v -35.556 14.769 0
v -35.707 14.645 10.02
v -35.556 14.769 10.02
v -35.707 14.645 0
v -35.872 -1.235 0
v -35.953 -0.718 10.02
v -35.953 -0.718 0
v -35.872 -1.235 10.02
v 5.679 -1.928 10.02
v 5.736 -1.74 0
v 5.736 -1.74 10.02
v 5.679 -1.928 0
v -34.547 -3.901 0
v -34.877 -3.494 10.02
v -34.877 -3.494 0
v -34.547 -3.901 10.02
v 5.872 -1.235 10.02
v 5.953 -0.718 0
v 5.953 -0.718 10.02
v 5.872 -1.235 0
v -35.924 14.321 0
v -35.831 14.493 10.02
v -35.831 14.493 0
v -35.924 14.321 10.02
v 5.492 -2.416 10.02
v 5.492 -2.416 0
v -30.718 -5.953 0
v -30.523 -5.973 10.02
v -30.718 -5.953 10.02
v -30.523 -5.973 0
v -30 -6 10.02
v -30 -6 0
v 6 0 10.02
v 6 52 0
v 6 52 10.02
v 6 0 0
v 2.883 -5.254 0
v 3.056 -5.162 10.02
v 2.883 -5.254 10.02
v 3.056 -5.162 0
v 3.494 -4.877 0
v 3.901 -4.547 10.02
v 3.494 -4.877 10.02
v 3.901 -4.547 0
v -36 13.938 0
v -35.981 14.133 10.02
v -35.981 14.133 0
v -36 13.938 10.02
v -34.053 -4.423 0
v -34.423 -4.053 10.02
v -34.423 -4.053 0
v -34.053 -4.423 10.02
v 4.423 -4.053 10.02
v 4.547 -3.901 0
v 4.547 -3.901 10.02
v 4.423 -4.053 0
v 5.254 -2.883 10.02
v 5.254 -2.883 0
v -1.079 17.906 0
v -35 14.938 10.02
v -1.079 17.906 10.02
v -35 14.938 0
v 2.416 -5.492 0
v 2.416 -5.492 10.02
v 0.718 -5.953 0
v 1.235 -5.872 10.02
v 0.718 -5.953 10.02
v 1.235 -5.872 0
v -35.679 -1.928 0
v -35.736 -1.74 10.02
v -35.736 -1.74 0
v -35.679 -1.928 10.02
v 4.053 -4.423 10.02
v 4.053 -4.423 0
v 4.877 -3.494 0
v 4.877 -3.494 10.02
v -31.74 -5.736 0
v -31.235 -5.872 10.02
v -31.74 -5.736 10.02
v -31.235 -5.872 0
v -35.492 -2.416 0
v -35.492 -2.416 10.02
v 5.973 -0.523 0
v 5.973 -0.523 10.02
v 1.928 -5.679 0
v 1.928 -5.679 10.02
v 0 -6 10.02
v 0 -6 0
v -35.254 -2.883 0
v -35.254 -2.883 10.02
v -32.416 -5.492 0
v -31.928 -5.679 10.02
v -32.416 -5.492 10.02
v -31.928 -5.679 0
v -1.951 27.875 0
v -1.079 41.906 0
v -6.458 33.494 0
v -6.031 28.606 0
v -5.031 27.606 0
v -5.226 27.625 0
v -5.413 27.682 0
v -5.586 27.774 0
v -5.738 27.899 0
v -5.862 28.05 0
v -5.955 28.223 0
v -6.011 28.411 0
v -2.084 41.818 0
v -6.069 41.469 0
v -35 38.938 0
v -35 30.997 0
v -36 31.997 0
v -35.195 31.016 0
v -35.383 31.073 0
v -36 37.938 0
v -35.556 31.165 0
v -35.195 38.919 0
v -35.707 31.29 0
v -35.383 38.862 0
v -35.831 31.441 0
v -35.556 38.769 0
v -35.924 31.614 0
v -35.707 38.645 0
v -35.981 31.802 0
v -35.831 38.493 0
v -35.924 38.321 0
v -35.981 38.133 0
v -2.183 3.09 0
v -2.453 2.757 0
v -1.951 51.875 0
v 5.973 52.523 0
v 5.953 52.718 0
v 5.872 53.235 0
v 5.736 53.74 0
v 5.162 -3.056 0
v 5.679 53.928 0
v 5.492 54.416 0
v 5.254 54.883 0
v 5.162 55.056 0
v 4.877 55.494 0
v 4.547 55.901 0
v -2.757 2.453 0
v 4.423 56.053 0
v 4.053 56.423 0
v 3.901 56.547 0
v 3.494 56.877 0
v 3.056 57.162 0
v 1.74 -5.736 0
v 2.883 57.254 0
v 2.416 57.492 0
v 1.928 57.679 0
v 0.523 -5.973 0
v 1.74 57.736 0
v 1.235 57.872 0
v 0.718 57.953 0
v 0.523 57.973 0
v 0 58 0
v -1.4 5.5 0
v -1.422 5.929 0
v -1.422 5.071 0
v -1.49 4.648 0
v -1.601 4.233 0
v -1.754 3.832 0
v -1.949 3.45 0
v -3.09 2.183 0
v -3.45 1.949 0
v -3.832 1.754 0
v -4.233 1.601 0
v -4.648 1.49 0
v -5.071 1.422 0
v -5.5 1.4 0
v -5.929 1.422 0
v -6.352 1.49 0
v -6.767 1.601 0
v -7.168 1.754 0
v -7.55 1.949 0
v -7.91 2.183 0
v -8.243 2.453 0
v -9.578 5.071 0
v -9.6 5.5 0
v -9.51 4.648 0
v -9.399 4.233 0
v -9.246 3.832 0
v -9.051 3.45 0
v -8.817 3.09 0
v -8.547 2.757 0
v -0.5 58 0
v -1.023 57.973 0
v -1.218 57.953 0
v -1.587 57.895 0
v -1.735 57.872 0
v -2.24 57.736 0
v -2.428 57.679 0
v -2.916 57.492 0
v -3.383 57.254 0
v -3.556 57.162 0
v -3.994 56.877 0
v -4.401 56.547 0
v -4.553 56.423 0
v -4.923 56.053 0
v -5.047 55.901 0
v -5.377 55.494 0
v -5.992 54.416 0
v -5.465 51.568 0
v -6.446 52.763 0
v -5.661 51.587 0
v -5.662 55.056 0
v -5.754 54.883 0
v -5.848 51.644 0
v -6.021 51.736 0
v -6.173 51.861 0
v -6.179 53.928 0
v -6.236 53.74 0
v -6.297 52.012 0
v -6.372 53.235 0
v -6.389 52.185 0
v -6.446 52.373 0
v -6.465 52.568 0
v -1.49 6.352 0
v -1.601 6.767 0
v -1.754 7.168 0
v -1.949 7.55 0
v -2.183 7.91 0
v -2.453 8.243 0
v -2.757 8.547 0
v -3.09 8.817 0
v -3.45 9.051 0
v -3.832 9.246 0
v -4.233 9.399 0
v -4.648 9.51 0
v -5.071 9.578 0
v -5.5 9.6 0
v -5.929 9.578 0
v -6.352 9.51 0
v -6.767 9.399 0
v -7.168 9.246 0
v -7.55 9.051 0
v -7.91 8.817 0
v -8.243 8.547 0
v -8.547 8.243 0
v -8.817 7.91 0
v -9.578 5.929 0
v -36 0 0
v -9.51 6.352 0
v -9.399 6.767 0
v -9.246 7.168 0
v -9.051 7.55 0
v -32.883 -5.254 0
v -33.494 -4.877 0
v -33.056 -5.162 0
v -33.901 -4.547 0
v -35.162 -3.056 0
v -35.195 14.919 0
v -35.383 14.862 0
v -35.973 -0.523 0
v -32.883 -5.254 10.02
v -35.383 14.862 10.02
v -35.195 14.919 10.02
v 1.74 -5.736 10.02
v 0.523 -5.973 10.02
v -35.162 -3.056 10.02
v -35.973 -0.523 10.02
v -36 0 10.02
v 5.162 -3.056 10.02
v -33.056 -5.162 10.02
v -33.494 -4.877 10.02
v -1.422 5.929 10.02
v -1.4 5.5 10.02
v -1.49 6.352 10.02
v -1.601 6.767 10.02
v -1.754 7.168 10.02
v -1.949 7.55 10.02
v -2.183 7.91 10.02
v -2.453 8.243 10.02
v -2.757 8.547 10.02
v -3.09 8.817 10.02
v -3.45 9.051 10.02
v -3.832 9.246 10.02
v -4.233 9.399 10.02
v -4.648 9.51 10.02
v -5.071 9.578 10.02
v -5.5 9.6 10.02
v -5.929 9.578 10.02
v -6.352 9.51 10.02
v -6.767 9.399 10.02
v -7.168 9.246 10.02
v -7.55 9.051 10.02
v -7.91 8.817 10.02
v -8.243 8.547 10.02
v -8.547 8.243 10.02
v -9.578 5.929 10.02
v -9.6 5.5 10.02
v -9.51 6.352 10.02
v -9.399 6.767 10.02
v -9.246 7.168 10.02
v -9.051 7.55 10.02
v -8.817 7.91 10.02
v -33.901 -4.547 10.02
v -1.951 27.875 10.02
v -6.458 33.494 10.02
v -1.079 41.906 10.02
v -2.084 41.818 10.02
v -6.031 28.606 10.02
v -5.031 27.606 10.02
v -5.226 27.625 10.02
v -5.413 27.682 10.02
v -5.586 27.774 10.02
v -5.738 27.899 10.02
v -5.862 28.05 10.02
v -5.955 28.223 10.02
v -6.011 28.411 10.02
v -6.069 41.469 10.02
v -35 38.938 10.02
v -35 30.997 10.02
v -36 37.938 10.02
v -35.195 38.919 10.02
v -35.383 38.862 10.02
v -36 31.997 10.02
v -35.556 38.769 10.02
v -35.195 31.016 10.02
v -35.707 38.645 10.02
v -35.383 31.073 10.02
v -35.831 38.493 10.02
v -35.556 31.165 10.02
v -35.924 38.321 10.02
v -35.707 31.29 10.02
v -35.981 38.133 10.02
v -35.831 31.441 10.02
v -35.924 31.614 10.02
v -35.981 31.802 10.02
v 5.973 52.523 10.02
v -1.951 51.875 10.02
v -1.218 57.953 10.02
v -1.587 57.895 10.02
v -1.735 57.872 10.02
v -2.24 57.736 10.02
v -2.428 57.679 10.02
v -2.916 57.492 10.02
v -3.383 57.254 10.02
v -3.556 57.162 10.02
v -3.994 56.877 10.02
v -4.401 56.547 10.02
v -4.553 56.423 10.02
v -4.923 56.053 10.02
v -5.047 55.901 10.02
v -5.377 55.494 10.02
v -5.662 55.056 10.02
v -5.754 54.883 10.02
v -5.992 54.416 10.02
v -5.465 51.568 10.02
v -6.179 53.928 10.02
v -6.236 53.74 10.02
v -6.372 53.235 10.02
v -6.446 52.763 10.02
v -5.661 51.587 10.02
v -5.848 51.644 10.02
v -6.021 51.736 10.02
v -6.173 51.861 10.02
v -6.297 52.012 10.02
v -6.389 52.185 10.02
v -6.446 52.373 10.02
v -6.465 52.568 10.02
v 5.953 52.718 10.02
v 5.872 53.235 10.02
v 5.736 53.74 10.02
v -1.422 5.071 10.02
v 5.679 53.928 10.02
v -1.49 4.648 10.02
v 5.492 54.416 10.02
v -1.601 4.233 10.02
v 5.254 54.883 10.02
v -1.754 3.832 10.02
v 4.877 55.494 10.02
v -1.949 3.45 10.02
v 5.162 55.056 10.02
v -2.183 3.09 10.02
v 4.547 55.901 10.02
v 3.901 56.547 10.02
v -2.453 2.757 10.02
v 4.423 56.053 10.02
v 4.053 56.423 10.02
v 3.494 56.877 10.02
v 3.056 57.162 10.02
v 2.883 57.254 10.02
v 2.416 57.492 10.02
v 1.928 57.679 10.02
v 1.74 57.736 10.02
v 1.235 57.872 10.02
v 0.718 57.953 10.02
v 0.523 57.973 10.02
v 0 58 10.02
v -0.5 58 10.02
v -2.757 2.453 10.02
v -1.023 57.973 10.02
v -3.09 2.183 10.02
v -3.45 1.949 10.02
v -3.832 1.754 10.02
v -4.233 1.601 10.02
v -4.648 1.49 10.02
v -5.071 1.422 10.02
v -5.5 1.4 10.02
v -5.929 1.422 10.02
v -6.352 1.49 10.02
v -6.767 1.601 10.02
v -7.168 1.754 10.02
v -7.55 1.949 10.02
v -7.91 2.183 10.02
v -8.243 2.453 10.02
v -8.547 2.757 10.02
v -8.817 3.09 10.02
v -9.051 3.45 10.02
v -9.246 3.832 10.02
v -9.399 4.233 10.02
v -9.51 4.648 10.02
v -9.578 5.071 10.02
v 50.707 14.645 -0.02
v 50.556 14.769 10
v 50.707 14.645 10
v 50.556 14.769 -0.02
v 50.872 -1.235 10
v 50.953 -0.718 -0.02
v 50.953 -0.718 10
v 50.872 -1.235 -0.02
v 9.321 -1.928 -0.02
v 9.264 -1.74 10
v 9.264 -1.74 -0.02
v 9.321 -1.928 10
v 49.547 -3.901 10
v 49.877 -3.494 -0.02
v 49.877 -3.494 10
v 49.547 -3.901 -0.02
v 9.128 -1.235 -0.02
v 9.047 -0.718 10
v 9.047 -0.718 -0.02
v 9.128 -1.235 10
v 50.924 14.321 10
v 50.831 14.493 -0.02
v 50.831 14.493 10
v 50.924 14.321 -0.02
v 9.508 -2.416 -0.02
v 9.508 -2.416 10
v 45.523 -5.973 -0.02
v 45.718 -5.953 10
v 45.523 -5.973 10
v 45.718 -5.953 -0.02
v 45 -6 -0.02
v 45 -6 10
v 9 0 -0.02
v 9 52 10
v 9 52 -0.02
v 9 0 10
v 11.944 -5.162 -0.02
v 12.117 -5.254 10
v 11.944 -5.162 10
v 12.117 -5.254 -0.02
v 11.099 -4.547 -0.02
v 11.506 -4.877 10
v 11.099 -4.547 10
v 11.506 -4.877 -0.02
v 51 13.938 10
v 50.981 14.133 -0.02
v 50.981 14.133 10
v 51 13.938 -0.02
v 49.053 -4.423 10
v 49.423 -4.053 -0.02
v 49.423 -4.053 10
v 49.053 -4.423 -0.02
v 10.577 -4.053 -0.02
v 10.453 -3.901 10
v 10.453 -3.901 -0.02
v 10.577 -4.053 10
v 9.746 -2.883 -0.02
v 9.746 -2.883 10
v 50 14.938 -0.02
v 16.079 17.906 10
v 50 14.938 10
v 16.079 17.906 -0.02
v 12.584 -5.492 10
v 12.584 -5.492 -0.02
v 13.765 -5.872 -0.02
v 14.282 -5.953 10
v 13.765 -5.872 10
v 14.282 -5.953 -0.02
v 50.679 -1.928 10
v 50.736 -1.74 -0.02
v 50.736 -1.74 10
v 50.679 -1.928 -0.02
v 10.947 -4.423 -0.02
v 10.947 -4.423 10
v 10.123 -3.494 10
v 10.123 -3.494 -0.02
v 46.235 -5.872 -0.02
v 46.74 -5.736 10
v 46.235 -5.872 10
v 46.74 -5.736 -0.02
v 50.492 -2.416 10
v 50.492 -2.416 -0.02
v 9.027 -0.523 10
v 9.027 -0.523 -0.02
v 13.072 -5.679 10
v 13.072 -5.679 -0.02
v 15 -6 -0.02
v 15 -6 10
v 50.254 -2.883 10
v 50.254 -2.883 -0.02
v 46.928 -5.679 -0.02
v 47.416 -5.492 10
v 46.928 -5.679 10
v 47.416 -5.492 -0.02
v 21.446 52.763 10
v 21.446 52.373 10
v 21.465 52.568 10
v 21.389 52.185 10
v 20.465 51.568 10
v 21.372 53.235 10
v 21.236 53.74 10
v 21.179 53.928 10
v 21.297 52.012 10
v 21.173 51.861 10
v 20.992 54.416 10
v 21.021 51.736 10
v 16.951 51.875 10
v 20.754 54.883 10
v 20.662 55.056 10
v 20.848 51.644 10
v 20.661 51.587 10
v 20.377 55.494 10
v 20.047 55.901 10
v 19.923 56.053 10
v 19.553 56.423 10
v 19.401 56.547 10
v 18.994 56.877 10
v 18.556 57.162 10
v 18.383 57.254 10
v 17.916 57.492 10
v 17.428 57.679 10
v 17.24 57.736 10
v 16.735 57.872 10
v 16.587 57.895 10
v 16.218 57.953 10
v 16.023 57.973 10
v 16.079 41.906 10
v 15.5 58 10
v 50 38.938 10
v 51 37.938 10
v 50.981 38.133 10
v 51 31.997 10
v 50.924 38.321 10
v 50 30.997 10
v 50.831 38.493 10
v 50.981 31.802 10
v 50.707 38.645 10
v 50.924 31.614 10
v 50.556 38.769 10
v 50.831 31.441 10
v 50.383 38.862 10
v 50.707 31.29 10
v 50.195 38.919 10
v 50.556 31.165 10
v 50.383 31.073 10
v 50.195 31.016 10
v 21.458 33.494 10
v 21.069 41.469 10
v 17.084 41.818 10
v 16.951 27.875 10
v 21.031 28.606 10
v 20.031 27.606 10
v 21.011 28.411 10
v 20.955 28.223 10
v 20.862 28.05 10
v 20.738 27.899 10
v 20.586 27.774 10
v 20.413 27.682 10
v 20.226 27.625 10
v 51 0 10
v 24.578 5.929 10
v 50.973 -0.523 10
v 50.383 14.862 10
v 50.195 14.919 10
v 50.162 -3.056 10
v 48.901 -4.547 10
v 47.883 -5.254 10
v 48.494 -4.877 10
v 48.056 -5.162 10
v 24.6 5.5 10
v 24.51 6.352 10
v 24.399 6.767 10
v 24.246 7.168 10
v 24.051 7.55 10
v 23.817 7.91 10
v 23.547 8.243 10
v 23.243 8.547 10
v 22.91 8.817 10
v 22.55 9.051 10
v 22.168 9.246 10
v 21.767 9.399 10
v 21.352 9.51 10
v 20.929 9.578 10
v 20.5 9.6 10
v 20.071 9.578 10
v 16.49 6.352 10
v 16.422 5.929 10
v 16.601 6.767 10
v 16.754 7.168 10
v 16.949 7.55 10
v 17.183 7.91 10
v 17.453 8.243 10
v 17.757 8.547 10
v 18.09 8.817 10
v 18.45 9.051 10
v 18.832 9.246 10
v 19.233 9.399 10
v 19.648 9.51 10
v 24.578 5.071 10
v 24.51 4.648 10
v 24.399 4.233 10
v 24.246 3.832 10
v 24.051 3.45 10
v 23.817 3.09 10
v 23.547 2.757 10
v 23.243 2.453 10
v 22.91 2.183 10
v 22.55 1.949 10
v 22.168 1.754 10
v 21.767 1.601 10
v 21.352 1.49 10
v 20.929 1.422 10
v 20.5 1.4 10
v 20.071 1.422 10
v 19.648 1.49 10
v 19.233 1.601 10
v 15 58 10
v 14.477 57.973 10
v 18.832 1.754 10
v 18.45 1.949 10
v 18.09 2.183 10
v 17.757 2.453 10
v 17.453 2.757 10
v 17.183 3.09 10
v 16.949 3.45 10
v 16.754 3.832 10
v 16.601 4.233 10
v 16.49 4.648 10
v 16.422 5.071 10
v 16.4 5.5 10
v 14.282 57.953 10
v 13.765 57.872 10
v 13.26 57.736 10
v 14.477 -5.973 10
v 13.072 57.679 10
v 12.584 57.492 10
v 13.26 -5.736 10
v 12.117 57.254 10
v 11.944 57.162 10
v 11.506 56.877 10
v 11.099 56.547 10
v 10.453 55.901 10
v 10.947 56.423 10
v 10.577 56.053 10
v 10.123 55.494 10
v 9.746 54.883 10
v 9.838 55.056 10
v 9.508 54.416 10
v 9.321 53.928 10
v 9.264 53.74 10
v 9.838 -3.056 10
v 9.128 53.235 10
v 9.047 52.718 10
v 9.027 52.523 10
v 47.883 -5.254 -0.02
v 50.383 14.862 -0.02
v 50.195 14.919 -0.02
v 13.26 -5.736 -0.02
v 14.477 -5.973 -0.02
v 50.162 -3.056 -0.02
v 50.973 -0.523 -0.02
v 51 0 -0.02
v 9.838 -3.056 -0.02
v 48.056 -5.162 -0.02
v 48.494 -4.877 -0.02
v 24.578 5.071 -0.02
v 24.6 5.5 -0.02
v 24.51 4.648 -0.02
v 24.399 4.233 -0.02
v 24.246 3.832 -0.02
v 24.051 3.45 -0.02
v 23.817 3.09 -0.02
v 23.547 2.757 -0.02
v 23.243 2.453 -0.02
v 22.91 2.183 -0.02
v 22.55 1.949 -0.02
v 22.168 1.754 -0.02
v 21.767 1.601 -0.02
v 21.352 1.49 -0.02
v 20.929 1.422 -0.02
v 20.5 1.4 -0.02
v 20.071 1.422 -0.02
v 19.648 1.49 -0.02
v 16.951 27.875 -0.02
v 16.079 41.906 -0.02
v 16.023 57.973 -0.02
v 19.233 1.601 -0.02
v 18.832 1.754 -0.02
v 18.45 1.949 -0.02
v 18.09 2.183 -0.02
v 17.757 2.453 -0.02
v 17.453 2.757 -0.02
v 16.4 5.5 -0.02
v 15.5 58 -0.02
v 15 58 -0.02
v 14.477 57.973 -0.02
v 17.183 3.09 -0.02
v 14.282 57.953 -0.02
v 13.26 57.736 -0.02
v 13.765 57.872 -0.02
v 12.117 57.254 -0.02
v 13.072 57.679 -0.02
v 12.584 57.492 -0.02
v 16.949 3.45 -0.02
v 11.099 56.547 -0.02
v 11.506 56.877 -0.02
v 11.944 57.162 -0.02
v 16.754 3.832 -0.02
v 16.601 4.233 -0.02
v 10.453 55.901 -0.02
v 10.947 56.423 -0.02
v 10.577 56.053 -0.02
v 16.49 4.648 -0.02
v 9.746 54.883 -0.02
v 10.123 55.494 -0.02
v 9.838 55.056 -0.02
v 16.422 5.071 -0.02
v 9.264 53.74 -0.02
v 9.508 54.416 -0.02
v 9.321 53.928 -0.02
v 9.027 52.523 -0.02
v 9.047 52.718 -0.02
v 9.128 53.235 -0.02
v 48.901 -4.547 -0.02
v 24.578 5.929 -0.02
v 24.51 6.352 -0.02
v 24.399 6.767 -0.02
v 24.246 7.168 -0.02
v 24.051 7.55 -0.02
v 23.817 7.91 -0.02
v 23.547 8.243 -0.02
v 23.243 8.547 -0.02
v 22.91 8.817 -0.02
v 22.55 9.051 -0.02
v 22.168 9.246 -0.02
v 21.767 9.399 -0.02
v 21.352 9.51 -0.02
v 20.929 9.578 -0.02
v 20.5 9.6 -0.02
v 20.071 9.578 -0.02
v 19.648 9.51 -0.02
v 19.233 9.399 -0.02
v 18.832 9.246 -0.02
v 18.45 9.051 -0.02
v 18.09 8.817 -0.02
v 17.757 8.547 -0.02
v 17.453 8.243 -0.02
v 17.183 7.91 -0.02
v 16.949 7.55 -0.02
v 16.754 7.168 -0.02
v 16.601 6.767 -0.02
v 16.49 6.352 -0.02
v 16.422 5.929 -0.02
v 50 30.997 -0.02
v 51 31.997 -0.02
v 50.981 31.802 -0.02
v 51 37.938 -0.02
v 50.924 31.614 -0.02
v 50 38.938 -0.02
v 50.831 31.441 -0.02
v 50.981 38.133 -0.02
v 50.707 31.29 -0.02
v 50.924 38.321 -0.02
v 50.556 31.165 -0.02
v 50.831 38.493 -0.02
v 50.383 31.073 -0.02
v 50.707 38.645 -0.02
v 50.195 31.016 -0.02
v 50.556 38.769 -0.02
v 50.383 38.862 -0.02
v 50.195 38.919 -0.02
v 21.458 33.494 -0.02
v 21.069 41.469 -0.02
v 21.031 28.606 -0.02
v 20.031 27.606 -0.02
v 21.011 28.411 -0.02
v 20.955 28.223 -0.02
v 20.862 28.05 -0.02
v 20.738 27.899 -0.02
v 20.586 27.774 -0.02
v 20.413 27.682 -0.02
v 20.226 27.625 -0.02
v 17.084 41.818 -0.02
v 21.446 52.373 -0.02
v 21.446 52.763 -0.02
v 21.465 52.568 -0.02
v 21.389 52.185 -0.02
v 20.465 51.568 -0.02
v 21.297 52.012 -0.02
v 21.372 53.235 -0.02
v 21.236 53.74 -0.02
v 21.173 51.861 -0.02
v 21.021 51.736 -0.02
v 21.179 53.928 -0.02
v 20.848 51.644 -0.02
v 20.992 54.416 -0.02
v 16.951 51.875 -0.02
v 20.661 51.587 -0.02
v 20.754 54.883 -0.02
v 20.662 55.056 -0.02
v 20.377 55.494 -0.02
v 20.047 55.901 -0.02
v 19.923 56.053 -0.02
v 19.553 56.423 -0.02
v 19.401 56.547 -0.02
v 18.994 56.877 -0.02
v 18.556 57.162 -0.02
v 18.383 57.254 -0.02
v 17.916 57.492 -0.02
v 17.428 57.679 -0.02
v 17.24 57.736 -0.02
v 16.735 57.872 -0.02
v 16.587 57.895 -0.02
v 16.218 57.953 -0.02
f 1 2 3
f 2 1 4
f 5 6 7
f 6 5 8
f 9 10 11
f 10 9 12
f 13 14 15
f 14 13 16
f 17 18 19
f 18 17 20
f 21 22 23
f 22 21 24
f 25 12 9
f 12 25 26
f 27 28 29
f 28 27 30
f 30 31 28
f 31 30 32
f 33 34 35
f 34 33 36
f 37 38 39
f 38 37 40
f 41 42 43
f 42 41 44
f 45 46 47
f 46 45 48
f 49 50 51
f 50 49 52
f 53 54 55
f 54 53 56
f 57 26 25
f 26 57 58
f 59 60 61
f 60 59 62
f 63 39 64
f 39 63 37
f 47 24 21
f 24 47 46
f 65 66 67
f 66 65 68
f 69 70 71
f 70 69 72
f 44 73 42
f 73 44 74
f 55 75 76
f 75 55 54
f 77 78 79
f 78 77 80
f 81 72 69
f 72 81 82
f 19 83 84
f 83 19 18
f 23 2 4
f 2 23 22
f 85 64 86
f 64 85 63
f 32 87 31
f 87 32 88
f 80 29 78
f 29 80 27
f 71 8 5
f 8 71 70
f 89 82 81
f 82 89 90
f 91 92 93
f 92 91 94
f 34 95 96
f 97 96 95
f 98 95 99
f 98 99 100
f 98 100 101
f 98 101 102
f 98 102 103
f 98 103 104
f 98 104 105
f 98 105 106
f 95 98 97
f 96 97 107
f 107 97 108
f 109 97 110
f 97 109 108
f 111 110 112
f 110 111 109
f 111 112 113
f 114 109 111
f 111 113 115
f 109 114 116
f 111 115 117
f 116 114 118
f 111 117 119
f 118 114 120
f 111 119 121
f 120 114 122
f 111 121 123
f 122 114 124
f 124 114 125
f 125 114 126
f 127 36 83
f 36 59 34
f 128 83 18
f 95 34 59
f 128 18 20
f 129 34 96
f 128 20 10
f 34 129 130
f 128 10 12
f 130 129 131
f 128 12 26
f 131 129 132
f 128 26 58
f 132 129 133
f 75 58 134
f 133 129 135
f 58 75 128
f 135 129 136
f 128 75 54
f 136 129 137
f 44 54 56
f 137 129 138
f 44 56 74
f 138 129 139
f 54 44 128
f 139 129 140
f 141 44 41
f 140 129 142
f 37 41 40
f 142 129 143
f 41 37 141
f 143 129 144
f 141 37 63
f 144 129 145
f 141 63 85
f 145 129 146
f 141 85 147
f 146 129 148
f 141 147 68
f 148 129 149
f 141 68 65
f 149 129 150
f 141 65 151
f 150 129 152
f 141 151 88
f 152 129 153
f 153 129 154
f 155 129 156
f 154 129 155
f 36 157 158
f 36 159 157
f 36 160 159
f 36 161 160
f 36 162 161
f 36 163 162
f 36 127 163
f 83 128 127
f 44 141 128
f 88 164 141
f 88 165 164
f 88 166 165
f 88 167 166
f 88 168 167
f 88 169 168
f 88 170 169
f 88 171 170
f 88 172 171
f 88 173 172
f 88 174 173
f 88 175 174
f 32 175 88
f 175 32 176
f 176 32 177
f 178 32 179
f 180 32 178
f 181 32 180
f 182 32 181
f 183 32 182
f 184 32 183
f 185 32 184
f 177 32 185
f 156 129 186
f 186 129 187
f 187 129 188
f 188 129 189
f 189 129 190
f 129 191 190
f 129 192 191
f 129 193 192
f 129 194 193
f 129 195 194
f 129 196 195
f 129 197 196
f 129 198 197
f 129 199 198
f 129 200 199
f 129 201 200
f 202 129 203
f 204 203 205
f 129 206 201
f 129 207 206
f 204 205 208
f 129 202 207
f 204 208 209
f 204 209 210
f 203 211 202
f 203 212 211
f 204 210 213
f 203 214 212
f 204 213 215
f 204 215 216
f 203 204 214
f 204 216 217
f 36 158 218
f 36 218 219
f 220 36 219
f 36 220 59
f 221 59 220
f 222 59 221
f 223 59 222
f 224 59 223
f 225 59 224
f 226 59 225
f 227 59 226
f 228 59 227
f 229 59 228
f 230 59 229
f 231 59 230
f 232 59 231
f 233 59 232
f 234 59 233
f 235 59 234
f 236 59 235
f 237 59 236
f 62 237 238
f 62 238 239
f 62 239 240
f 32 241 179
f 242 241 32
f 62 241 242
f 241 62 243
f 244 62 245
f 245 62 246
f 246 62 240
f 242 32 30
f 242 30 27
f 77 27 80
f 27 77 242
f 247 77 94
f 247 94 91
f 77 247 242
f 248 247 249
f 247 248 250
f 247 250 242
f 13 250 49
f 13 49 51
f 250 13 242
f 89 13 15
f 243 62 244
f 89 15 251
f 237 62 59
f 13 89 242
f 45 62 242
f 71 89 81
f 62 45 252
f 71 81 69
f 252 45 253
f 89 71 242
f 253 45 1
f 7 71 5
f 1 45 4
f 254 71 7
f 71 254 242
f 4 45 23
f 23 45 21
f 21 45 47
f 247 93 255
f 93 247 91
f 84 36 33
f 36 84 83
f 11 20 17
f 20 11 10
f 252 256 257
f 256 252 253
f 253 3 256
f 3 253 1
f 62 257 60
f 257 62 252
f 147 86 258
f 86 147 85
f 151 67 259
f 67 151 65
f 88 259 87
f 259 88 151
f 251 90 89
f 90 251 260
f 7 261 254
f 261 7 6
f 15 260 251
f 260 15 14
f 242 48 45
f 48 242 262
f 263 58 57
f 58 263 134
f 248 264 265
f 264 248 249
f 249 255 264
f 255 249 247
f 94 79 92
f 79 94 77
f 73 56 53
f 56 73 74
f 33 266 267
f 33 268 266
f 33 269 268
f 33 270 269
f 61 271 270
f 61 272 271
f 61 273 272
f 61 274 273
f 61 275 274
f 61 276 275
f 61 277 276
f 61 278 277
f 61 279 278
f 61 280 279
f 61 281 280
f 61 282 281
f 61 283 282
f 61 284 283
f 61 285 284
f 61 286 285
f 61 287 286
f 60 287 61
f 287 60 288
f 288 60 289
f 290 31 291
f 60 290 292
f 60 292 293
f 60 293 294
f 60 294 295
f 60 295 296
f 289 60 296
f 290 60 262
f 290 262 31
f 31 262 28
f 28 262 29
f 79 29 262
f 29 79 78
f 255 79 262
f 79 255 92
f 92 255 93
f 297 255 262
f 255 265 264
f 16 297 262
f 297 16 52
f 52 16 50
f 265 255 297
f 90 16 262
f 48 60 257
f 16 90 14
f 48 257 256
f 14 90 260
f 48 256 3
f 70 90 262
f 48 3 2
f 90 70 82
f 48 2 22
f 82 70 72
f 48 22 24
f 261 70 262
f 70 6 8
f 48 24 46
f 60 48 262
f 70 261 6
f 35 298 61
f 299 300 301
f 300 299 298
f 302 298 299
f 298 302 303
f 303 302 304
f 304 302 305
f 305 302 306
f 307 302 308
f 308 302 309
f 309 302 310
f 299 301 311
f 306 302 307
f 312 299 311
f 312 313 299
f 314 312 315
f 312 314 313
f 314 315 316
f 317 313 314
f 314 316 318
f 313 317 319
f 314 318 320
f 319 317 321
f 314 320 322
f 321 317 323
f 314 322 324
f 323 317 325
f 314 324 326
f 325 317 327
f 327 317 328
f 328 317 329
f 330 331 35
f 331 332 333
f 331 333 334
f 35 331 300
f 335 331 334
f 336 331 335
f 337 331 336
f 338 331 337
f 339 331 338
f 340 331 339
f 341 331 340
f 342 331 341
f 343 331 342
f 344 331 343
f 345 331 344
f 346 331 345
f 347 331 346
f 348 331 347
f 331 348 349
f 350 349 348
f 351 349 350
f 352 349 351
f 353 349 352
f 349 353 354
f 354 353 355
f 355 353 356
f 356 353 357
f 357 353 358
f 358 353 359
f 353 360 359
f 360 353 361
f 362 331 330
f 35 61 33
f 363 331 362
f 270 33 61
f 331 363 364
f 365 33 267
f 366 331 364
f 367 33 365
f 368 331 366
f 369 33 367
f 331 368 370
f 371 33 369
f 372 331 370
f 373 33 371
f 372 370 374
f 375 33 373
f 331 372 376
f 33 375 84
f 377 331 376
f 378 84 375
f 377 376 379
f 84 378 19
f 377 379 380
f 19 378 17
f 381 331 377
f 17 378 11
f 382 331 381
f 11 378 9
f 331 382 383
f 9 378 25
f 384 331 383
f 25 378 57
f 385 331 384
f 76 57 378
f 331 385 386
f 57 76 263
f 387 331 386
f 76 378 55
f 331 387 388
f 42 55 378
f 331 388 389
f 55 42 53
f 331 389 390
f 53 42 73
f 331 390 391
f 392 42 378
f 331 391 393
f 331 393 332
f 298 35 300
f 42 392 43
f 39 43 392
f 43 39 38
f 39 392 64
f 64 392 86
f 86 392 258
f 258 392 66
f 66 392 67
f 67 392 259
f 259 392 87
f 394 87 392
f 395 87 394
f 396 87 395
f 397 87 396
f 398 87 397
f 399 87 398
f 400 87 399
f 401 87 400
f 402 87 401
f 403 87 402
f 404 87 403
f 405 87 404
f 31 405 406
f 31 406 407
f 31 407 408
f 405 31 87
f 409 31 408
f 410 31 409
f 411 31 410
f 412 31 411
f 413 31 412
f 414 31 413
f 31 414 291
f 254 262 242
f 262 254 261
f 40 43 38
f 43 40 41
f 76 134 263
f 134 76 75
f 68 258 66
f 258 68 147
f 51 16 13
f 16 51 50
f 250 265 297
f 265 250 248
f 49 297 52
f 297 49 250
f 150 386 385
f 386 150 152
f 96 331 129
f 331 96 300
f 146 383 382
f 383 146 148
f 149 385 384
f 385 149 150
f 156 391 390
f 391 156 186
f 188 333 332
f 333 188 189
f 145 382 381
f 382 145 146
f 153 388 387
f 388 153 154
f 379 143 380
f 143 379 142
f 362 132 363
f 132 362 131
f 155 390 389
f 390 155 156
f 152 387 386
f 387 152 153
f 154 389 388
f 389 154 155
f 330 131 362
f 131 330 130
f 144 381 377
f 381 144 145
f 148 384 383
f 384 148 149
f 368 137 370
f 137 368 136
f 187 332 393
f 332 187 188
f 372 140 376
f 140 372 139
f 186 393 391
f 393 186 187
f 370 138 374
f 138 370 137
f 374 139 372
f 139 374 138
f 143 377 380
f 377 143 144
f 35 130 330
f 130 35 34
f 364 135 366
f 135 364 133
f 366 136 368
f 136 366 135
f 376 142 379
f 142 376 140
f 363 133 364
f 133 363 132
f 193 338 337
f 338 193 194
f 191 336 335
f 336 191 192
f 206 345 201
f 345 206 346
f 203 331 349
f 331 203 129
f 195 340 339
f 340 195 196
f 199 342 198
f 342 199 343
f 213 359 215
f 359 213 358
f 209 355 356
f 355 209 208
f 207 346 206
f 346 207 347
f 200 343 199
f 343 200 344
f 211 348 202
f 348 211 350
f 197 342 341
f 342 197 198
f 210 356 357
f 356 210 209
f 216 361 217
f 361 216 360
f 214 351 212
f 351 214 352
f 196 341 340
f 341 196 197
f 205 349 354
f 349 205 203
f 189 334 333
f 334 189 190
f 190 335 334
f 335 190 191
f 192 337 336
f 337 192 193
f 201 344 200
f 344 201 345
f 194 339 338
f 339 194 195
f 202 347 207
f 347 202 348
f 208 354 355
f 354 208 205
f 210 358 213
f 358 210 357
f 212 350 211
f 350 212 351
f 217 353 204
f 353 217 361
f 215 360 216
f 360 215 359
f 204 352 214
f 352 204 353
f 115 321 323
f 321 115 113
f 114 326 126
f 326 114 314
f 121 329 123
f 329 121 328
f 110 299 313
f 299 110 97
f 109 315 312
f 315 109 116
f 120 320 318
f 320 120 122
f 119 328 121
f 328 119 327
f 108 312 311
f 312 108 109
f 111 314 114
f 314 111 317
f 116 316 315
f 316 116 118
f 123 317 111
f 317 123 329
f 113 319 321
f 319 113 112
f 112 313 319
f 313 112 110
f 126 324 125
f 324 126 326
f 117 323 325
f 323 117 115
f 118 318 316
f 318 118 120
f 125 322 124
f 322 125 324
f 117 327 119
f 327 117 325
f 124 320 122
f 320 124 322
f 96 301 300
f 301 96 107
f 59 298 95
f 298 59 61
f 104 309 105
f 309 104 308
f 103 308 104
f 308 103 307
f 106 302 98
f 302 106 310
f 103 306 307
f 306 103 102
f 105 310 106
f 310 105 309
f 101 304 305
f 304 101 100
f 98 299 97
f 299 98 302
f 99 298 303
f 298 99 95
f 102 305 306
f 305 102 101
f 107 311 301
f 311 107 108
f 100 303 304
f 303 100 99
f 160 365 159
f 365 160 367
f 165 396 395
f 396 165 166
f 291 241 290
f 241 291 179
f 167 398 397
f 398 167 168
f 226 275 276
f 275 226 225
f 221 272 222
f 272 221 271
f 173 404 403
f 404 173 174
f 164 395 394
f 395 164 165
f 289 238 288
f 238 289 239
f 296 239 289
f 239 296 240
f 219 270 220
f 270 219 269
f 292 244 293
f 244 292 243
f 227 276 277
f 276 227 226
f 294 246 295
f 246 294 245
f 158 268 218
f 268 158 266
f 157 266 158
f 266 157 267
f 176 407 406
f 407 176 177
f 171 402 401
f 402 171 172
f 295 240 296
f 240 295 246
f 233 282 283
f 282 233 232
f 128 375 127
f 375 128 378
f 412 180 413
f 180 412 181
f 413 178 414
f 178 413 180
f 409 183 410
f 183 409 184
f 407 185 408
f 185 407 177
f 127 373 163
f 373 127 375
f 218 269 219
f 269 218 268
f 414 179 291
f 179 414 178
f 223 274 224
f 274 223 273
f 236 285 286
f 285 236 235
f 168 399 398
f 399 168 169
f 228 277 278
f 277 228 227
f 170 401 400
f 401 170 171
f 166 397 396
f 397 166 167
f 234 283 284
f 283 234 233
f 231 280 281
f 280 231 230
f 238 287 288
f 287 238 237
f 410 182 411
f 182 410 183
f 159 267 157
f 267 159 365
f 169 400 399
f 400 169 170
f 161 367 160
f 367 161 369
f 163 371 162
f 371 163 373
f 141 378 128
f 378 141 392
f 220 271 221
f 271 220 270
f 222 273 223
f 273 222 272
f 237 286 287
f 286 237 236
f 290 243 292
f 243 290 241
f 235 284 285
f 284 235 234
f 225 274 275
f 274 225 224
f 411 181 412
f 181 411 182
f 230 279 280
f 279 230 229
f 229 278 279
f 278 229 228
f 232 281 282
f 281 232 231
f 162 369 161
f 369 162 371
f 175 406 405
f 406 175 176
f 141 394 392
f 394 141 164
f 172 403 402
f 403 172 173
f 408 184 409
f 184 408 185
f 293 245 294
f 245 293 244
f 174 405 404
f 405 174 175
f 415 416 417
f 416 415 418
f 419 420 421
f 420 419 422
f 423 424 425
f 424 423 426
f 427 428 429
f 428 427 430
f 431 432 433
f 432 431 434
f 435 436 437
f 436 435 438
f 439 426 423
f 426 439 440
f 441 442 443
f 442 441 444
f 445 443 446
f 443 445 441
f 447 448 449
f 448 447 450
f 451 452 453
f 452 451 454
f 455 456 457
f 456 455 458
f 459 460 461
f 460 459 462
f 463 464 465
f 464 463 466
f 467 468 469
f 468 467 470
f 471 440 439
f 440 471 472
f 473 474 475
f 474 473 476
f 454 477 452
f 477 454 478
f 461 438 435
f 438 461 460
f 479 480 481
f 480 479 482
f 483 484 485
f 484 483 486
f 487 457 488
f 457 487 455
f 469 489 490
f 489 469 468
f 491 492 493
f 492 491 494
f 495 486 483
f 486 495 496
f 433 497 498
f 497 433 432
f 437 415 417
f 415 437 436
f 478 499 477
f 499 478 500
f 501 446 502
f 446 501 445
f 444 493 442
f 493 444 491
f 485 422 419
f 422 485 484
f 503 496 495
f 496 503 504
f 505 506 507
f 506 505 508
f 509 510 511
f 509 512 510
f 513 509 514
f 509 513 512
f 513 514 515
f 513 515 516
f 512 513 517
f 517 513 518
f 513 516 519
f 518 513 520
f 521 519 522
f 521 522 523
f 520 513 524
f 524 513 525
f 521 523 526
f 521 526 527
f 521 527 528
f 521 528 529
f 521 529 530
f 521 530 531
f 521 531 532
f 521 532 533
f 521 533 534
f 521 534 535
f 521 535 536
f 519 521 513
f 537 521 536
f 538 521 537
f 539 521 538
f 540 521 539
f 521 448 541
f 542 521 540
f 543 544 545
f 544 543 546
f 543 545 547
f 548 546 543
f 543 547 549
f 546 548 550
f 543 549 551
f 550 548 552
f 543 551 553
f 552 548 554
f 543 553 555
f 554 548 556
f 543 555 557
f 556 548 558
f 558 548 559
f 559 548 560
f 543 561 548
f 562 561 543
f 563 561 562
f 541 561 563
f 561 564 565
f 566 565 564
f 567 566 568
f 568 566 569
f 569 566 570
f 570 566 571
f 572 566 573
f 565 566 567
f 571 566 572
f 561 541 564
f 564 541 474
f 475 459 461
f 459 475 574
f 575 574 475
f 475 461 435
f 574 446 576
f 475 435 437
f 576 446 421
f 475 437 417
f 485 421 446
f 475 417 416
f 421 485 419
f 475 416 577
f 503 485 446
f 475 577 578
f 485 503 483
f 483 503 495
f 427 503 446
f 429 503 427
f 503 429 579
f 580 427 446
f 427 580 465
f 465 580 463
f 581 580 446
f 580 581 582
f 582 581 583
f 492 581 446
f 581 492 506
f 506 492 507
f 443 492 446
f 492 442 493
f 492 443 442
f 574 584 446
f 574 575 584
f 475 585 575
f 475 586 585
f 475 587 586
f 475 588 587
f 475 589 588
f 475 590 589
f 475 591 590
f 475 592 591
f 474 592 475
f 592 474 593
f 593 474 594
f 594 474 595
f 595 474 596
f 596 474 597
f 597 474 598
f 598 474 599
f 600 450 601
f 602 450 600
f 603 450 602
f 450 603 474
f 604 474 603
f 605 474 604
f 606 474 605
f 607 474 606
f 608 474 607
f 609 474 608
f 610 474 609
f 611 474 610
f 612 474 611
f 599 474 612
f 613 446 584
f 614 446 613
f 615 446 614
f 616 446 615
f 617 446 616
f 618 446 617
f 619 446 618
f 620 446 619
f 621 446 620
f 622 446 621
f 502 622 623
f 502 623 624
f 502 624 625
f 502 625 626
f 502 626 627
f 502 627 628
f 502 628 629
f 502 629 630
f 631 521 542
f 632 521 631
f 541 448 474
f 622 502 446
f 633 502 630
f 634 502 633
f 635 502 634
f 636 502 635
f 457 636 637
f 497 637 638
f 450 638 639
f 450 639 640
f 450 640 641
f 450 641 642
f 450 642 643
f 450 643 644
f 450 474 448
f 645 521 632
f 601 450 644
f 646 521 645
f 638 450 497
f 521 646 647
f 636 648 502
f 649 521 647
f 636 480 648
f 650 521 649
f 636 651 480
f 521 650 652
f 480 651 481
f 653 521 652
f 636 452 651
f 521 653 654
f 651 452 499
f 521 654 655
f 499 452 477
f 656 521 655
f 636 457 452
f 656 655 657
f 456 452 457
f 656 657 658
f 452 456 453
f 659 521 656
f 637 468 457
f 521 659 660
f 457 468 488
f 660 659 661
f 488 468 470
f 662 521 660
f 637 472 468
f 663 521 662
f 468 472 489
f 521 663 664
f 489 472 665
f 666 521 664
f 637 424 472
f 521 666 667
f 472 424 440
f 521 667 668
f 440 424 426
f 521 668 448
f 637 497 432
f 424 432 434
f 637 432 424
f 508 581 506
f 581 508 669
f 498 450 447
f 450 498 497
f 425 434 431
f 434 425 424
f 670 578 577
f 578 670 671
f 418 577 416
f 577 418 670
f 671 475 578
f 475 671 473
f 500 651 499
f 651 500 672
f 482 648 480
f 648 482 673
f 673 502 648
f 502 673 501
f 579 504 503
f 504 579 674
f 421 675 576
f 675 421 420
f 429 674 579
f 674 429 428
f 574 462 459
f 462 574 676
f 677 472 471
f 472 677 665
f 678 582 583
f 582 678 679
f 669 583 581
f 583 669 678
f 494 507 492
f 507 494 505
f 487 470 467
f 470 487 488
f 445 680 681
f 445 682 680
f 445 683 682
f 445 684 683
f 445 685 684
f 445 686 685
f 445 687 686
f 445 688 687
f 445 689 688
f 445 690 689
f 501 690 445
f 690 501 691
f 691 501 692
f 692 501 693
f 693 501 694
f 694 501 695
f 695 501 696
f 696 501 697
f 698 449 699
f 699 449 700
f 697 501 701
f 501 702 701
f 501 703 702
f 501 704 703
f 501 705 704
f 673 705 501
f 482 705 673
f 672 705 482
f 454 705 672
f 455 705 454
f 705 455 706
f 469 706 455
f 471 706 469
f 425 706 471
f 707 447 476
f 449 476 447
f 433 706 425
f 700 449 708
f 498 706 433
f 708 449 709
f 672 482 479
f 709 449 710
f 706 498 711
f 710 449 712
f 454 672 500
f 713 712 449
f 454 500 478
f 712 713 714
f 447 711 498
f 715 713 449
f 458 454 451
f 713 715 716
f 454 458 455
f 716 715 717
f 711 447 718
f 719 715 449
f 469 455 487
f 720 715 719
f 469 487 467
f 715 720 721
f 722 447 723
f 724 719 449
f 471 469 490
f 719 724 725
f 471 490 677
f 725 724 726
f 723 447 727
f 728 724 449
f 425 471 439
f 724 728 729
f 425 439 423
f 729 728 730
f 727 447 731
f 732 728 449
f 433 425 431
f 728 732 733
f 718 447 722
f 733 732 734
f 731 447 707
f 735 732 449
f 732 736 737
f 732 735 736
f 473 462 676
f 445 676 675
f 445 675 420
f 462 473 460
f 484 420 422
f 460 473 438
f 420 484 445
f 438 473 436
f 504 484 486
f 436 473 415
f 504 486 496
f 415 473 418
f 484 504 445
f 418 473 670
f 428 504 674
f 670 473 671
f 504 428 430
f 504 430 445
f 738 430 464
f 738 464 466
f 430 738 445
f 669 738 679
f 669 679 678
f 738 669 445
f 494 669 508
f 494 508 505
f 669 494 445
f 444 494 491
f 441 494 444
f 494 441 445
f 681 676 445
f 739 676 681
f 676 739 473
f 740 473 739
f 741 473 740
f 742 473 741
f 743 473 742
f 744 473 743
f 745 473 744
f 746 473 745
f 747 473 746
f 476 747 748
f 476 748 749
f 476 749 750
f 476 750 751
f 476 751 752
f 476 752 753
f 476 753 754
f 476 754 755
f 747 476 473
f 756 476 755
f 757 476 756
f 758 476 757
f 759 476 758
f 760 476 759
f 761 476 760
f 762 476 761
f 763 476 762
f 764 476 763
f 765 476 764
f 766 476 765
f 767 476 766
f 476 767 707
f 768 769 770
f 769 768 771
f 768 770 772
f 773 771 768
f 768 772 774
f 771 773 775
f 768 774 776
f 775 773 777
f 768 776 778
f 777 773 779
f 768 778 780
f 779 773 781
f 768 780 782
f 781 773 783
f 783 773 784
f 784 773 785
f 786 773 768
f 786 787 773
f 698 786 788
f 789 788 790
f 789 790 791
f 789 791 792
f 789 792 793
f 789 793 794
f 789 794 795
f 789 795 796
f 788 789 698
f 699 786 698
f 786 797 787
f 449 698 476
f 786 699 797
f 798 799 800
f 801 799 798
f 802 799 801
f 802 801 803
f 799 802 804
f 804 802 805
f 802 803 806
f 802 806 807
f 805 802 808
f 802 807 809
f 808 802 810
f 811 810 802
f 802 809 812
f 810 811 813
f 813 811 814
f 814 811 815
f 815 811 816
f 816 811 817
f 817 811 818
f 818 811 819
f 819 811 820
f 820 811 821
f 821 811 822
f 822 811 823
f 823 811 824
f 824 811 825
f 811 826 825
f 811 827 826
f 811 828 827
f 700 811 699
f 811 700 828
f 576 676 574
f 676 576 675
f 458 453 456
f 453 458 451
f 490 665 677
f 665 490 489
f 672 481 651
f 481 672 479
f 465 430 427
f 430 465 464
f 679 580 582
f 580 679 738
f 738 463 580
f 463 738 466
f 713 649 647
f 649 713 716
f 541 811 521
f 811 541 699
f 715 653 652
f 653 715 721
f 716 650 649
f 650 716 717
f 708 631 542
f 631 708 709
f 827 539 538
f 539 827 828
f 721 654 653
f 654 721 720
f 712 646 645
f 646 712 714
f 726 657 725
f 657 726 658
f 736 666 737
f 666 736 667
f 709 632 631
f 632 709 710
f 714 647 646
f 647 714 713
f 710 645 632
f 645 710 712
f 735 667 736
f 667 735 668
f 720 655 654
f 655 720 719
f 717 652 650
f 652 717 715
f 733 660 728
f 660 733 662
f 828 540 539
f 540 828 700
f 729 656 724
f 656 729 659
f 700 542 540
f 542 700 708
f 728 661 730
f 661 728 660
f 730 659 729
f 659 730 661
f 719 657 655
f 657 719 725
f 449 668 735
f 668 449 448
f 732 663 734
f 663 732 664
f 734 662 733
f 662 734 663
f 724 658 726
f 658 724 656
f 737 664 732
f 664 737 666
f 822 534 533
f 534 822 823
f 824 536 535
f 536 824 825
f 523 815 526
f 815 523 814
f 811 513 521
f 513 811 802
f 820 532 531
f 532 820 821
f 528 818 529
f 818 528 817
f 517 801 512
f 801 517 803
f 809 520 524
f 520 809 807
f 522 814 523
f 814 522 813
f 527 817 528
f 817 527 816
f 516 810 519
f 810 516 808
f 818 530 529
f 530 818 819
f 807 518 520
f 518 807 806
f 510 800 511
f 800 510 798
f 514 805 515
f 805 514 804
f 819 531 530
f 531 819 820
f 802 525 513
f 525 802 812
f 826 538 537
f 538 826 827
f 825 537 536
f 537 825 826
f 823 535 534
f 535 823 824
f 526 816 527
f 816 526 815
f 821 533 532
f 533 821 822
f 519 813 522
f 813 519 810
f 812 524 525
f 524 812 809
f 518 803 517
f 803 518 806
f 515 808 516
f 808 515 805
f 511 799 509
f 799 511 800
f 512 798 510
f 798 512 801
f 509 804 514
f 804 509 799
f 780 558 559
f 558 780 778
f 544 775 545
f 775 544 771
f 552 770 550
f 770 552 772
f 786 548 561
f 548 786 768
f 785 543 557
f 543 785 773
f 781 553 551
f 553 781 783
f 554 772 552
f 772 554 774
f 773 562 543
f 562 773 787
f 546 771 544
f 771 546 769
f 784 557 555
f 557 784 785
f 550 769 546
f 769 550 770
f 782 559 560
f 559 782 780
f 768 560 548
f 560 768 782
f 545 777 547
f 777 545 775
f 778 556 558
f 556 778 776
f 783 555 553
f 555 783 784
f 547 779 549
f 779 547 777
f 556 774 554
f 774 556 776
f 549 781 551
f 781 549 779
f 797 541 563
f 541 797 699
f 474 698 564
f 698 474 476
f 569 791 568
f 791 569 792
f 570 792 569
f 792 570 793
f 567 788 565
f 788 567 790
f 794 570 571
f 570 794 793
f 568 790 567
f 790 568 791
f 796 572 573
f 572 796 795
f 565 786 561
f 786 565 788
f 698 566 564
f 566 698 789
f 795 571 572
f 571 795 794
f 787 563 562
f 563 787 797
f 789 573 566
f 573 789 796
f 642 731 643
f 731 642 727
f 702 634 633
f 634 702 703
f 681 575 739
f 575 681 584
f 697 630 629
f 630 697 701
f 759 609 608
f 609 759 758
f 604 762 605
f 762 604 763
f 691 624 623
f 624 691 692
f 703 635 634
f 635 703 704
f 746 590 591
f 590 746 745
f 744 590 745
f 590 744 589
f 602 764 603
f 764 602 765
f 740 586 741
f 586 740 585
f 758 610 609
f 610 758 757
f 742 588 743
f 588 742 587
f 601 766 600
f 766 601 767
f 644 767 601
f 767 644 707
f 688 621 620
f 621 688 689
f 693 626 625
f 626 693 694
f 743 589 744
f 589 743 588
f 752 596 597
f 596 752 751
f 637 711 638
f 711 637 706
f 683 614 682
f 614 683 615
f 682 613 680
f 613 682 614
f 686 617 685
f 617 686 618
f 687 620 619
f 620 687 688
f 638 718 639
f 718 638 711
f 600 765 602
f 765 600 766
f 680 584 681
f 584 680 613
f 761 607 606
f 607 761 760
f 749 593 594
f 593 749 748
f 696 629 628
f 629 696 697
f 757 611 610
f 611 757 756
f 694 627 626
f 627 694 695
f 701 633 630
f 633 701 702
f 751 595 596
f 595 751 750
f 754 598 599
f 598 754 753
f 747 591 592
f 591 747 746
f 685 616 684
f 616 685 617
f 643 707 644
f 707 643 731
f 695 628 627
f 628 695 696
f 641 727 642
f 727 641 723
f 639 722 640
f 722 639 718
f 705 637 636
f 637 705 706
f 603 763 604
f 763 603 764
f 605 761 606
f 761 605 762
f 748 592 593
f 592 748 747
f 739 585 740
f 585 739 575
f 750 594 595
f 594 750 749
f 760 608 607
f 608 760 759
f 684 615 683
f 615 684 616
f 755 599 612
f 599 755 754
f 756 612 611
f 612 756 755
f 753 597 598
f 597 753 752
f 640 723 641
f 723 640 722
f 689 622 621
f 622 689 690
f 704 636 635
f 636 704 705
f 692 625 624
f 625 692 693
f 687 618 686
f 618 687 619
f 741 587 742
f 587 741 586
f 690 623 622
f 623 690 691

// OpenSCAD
num_keyboards = 2;		// [1:1:20]
keyboard_to_keyboard = 24;	// [8:100]
keyboard_thickness = 12;	// [5:100]
flange = 4;			// [1:50]
thickness = 10;			// [3:50]

/* [Hidden] */
$fa = 6;
$fs = 0.2;
e = 0.01;

for (side=[0,1]) translate([side * 15, 0, side*thickness]) rotate([0, -90+side*180, 0])
difference()
{
	minkowski()
	{	
		difference()
		{
			minkowski()
			{	
				difference()
				{
					ySz = (num_keyboards - 1) * keyboard_to_keyboard + keyboard_thickness + 16;
					cube([thickness, ySz, 30]);
					translate([-e, ySz-keyboard_thickness-2, max(e, flange - 3.5)])cube([thickness+2*e, ySz, 30]);
				}
				rotate([0, 90, 0]) cylinder(e, r=5);
			}
			
			for (keyb = [0:num_keyboards-1])
			translate([-10, 17 + keyb * keyboard_to_keyboard, 0]) rotate([5, 0, 0]) union()
			{
				cube([200, keyboard_thickness, 100]);
				if (keyb < num_keyboards-1)
					translate([0, keyboard_thickness-e, flange]) cube([200, keyboard_thickness/2, 100]);
			}
			
		}

		rotate([0, 90, 0]) cylinder(e, r=1);
	}

	translate([-10, 5.5, 5.5]) rotate([0, 90, 0]) cylinder(200, d=8.2);
}

